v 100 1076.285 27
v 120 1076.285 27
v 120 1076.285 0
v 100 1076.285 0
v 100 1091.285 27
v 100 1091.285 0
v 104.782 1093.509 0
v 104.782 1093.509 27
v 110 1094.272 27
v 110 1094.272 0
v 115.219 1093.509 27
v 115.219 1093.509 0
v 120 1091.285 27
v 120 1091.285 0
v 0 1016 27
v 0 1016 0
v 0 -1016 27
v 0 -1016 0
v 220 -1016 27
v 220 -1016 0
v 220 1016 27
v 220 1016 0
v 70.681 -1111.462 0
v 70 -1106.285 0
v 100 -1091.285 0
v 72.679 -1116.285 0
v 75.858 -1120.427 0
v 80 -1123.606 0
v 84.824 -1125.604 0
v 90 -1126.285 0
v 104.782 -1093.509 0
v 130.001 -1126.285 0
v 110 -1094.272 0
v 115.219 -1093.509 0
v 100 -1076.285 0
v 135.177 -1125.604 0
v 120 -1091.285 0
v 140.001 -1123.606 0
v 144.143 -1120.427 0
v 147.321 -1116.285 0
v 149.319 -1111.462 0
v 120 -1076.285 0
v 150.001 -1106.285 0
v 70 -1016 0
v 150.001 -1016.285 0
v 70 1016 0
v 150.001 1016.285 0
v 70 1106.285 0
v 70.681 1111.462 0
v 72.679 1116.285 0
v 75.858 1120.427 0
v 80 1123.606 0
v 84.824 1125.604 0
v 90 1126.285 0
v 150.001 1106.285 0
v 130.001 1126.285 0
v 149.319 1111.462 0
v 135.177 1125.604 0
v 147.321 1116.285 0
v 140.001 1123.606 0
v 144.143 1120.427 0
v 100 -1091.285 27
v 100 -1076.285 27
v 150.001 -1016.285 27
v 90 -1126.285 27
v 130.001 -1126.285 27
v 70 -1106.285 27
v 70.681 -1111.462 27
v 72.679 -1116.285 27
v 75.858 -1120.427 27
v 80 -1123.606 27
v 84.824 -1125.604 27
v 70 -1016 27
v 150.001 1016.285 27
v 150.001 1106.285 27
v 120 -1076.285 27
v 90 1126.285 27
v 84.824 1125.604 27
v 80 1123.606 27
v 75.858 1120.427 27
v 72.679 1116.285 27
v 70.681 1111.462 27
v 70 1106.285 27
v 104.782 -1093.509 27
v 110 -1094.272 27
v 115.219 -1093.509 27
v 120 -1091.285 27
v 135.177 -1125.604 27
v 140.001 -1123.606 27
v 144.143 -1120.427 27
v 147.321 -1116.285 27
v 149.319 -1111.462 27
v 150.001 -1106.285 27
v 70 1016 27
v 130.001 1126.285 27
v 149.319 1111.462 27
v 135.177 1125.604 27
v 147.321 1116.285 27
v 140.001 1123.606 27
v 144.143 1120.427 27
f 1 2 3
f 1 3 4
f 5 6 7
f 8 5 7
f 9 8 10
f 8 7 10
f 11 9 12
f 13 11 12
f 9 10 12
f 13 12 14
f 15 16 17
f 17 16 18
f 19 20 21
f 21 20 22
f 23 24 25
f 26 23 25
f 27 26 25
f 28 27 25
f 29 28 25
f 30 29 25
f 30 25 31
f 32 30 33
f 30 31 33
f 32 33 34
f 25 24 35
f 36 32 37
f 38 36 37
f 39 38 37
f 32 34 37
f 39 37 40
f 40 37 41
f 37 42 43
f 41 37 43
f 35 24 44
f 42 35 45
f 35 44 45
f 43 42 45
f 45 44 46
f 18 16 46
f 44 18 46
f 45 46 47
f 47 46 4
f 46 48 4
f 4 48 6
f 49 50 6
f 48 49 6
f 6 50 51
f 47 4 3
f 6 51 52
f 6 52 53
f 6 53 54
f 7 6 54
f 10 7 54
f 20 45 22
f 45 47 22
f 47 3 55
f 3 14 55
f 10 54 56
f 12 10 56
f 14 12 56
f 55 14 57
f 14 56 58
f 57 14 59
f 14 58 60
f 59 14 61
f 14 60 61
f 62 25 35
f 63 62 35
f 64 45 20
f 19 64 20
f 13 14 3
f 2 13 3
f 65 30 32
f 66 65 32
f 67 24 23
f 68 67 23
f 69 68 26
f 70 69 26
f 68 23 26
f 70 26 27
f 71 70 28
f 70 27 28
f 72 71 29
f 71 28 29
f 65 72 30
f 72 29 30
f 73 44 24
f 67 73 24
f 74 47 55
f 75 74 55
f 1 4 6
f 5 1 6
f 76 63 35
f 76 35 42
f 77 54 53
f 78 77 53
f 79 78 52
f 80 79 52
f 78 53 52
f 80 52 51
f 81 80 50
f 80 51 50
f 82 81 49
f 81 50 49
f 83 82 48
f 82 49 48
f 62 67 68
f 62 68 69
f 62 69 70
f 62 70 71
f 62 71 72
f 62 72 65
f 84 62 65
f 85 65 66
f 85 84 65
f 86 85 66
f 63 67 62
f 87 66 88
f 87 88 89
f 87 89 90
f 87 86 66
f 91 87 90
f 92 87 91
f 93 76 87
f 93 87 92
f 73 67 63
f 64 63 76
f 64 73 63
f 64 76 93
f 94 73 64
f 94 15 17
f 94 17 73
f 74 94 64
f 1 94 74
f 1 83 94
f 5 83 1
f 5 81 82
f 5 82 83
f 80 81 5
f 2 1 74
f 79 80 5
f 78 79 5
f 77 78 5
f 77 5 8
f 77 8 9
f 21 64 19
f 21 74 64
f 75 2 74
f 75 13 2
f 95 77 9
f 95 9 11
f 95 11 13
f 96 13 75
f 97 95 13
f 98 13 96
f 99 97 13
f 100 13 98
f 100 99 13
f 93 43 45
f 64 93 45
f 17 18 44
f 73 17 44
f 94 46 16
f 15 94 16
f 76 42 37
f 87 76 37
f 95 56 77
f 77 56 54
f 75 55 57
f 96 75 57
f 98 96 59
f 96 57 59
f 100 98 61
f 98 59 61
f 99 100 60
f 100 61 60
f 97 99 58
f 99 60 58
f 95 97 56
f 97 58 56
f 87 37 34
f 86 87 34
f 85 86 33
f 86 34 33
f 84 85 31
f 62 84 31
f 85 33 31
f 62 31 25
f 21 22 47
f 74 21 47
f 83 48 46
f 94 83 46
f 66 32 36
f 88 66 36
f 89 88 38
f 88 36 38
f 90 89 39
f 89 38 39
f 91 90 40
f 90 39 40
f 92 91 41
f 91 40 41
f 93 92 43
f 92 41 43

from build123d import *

# Parameters (mm, degrees)
F1_DEPTH = 27


with BuildPart() as f1:
    # F0 (on Top) → F1 (new body)
    with BuildSketch(Plane.XY):
        with BuildLine():
            Line((70, 1016), (0, 1016))
            Line((0, 1016), (0, 0))
            Line((0, 0), (220, 0))
            Line((220, 0), (220, 1016))
            Line((220, 1016), (150.000581, 1016.285126))
            Line((150.000581, 1016.285126), (150.000581, 1106.285126))
            ThreePointArc((150.000581, 1106.285126), (144.142716, 1120.427261), (130.000581, 1126.285126))
            Line((130.000581, 1126.285126), (90, 1126.285126))
            ThreePointArc((90, 1126.285126), (75.857864, 1120.427261), (70, 1106.285126))
            Line((70, 1106.285126), (70, 1016))
        make_face()
        with BuildLine():
            Line((120.00029, 1076.285126), (110.00029, 1076.285126))
            Line((110.00029, 1076.285126), (100.00029, 1076.285126))
            Line((100.00029, 1076.285126), (100.00029, 1091.285126))
            ThreePointArc((100.00029, 1091.285126), (110.00029, 1094.271711), (120.00029, 1091.285126))
            Line((120.00029, 1091.285126), (120.00029, 1076.285126))
        make_face(mode=Mode.SUBTRACT)
        with BuildLine():
            Line((220, 0), (0, 0))
            Line((0, 0), (0, -1016))
            Line((0, -1016), (70, -1016))
            Line((70, -1016), (70, -1106.285126))
            ThreePointArc((70, -1106.285126), (75.857864, -1120.427261), (90, -1126.285126))
            Line((90, -1126.285126), (130.000581, -1126.285126))
            ThreePointArc((130.000581, -1126.285126), (144.142716, -1120.427261), (150.000581, -1106.285126))
            Line((150.000581, -1106.285126), (150.000581, -1016.285126))
            Line((150.000581, -1016.285126), (220, -1016))
            Line((220, -1016), (220, 0))
        make_face()
        with BuildLine():
            Line((120.00029, -1076.285126), (120.00029, -1091.285126))
            ThreePointArc((120.00029, -1091.285126), (110.00029, -1094.271711), (100.00029, -1091.285126))
            Line((100.00029, -1091.285126), (100.00029, -1076.285126))
            Line((100.00029, -1076.285126), (110.00029, -1076.285126))
            Line((110.00029, -1076.285126), (120.00029, -1076.285126))
        make_face(mode=Mode.SUBTRACT)
    extrude(amount=F1_DEPTH)


solid = f1.part
